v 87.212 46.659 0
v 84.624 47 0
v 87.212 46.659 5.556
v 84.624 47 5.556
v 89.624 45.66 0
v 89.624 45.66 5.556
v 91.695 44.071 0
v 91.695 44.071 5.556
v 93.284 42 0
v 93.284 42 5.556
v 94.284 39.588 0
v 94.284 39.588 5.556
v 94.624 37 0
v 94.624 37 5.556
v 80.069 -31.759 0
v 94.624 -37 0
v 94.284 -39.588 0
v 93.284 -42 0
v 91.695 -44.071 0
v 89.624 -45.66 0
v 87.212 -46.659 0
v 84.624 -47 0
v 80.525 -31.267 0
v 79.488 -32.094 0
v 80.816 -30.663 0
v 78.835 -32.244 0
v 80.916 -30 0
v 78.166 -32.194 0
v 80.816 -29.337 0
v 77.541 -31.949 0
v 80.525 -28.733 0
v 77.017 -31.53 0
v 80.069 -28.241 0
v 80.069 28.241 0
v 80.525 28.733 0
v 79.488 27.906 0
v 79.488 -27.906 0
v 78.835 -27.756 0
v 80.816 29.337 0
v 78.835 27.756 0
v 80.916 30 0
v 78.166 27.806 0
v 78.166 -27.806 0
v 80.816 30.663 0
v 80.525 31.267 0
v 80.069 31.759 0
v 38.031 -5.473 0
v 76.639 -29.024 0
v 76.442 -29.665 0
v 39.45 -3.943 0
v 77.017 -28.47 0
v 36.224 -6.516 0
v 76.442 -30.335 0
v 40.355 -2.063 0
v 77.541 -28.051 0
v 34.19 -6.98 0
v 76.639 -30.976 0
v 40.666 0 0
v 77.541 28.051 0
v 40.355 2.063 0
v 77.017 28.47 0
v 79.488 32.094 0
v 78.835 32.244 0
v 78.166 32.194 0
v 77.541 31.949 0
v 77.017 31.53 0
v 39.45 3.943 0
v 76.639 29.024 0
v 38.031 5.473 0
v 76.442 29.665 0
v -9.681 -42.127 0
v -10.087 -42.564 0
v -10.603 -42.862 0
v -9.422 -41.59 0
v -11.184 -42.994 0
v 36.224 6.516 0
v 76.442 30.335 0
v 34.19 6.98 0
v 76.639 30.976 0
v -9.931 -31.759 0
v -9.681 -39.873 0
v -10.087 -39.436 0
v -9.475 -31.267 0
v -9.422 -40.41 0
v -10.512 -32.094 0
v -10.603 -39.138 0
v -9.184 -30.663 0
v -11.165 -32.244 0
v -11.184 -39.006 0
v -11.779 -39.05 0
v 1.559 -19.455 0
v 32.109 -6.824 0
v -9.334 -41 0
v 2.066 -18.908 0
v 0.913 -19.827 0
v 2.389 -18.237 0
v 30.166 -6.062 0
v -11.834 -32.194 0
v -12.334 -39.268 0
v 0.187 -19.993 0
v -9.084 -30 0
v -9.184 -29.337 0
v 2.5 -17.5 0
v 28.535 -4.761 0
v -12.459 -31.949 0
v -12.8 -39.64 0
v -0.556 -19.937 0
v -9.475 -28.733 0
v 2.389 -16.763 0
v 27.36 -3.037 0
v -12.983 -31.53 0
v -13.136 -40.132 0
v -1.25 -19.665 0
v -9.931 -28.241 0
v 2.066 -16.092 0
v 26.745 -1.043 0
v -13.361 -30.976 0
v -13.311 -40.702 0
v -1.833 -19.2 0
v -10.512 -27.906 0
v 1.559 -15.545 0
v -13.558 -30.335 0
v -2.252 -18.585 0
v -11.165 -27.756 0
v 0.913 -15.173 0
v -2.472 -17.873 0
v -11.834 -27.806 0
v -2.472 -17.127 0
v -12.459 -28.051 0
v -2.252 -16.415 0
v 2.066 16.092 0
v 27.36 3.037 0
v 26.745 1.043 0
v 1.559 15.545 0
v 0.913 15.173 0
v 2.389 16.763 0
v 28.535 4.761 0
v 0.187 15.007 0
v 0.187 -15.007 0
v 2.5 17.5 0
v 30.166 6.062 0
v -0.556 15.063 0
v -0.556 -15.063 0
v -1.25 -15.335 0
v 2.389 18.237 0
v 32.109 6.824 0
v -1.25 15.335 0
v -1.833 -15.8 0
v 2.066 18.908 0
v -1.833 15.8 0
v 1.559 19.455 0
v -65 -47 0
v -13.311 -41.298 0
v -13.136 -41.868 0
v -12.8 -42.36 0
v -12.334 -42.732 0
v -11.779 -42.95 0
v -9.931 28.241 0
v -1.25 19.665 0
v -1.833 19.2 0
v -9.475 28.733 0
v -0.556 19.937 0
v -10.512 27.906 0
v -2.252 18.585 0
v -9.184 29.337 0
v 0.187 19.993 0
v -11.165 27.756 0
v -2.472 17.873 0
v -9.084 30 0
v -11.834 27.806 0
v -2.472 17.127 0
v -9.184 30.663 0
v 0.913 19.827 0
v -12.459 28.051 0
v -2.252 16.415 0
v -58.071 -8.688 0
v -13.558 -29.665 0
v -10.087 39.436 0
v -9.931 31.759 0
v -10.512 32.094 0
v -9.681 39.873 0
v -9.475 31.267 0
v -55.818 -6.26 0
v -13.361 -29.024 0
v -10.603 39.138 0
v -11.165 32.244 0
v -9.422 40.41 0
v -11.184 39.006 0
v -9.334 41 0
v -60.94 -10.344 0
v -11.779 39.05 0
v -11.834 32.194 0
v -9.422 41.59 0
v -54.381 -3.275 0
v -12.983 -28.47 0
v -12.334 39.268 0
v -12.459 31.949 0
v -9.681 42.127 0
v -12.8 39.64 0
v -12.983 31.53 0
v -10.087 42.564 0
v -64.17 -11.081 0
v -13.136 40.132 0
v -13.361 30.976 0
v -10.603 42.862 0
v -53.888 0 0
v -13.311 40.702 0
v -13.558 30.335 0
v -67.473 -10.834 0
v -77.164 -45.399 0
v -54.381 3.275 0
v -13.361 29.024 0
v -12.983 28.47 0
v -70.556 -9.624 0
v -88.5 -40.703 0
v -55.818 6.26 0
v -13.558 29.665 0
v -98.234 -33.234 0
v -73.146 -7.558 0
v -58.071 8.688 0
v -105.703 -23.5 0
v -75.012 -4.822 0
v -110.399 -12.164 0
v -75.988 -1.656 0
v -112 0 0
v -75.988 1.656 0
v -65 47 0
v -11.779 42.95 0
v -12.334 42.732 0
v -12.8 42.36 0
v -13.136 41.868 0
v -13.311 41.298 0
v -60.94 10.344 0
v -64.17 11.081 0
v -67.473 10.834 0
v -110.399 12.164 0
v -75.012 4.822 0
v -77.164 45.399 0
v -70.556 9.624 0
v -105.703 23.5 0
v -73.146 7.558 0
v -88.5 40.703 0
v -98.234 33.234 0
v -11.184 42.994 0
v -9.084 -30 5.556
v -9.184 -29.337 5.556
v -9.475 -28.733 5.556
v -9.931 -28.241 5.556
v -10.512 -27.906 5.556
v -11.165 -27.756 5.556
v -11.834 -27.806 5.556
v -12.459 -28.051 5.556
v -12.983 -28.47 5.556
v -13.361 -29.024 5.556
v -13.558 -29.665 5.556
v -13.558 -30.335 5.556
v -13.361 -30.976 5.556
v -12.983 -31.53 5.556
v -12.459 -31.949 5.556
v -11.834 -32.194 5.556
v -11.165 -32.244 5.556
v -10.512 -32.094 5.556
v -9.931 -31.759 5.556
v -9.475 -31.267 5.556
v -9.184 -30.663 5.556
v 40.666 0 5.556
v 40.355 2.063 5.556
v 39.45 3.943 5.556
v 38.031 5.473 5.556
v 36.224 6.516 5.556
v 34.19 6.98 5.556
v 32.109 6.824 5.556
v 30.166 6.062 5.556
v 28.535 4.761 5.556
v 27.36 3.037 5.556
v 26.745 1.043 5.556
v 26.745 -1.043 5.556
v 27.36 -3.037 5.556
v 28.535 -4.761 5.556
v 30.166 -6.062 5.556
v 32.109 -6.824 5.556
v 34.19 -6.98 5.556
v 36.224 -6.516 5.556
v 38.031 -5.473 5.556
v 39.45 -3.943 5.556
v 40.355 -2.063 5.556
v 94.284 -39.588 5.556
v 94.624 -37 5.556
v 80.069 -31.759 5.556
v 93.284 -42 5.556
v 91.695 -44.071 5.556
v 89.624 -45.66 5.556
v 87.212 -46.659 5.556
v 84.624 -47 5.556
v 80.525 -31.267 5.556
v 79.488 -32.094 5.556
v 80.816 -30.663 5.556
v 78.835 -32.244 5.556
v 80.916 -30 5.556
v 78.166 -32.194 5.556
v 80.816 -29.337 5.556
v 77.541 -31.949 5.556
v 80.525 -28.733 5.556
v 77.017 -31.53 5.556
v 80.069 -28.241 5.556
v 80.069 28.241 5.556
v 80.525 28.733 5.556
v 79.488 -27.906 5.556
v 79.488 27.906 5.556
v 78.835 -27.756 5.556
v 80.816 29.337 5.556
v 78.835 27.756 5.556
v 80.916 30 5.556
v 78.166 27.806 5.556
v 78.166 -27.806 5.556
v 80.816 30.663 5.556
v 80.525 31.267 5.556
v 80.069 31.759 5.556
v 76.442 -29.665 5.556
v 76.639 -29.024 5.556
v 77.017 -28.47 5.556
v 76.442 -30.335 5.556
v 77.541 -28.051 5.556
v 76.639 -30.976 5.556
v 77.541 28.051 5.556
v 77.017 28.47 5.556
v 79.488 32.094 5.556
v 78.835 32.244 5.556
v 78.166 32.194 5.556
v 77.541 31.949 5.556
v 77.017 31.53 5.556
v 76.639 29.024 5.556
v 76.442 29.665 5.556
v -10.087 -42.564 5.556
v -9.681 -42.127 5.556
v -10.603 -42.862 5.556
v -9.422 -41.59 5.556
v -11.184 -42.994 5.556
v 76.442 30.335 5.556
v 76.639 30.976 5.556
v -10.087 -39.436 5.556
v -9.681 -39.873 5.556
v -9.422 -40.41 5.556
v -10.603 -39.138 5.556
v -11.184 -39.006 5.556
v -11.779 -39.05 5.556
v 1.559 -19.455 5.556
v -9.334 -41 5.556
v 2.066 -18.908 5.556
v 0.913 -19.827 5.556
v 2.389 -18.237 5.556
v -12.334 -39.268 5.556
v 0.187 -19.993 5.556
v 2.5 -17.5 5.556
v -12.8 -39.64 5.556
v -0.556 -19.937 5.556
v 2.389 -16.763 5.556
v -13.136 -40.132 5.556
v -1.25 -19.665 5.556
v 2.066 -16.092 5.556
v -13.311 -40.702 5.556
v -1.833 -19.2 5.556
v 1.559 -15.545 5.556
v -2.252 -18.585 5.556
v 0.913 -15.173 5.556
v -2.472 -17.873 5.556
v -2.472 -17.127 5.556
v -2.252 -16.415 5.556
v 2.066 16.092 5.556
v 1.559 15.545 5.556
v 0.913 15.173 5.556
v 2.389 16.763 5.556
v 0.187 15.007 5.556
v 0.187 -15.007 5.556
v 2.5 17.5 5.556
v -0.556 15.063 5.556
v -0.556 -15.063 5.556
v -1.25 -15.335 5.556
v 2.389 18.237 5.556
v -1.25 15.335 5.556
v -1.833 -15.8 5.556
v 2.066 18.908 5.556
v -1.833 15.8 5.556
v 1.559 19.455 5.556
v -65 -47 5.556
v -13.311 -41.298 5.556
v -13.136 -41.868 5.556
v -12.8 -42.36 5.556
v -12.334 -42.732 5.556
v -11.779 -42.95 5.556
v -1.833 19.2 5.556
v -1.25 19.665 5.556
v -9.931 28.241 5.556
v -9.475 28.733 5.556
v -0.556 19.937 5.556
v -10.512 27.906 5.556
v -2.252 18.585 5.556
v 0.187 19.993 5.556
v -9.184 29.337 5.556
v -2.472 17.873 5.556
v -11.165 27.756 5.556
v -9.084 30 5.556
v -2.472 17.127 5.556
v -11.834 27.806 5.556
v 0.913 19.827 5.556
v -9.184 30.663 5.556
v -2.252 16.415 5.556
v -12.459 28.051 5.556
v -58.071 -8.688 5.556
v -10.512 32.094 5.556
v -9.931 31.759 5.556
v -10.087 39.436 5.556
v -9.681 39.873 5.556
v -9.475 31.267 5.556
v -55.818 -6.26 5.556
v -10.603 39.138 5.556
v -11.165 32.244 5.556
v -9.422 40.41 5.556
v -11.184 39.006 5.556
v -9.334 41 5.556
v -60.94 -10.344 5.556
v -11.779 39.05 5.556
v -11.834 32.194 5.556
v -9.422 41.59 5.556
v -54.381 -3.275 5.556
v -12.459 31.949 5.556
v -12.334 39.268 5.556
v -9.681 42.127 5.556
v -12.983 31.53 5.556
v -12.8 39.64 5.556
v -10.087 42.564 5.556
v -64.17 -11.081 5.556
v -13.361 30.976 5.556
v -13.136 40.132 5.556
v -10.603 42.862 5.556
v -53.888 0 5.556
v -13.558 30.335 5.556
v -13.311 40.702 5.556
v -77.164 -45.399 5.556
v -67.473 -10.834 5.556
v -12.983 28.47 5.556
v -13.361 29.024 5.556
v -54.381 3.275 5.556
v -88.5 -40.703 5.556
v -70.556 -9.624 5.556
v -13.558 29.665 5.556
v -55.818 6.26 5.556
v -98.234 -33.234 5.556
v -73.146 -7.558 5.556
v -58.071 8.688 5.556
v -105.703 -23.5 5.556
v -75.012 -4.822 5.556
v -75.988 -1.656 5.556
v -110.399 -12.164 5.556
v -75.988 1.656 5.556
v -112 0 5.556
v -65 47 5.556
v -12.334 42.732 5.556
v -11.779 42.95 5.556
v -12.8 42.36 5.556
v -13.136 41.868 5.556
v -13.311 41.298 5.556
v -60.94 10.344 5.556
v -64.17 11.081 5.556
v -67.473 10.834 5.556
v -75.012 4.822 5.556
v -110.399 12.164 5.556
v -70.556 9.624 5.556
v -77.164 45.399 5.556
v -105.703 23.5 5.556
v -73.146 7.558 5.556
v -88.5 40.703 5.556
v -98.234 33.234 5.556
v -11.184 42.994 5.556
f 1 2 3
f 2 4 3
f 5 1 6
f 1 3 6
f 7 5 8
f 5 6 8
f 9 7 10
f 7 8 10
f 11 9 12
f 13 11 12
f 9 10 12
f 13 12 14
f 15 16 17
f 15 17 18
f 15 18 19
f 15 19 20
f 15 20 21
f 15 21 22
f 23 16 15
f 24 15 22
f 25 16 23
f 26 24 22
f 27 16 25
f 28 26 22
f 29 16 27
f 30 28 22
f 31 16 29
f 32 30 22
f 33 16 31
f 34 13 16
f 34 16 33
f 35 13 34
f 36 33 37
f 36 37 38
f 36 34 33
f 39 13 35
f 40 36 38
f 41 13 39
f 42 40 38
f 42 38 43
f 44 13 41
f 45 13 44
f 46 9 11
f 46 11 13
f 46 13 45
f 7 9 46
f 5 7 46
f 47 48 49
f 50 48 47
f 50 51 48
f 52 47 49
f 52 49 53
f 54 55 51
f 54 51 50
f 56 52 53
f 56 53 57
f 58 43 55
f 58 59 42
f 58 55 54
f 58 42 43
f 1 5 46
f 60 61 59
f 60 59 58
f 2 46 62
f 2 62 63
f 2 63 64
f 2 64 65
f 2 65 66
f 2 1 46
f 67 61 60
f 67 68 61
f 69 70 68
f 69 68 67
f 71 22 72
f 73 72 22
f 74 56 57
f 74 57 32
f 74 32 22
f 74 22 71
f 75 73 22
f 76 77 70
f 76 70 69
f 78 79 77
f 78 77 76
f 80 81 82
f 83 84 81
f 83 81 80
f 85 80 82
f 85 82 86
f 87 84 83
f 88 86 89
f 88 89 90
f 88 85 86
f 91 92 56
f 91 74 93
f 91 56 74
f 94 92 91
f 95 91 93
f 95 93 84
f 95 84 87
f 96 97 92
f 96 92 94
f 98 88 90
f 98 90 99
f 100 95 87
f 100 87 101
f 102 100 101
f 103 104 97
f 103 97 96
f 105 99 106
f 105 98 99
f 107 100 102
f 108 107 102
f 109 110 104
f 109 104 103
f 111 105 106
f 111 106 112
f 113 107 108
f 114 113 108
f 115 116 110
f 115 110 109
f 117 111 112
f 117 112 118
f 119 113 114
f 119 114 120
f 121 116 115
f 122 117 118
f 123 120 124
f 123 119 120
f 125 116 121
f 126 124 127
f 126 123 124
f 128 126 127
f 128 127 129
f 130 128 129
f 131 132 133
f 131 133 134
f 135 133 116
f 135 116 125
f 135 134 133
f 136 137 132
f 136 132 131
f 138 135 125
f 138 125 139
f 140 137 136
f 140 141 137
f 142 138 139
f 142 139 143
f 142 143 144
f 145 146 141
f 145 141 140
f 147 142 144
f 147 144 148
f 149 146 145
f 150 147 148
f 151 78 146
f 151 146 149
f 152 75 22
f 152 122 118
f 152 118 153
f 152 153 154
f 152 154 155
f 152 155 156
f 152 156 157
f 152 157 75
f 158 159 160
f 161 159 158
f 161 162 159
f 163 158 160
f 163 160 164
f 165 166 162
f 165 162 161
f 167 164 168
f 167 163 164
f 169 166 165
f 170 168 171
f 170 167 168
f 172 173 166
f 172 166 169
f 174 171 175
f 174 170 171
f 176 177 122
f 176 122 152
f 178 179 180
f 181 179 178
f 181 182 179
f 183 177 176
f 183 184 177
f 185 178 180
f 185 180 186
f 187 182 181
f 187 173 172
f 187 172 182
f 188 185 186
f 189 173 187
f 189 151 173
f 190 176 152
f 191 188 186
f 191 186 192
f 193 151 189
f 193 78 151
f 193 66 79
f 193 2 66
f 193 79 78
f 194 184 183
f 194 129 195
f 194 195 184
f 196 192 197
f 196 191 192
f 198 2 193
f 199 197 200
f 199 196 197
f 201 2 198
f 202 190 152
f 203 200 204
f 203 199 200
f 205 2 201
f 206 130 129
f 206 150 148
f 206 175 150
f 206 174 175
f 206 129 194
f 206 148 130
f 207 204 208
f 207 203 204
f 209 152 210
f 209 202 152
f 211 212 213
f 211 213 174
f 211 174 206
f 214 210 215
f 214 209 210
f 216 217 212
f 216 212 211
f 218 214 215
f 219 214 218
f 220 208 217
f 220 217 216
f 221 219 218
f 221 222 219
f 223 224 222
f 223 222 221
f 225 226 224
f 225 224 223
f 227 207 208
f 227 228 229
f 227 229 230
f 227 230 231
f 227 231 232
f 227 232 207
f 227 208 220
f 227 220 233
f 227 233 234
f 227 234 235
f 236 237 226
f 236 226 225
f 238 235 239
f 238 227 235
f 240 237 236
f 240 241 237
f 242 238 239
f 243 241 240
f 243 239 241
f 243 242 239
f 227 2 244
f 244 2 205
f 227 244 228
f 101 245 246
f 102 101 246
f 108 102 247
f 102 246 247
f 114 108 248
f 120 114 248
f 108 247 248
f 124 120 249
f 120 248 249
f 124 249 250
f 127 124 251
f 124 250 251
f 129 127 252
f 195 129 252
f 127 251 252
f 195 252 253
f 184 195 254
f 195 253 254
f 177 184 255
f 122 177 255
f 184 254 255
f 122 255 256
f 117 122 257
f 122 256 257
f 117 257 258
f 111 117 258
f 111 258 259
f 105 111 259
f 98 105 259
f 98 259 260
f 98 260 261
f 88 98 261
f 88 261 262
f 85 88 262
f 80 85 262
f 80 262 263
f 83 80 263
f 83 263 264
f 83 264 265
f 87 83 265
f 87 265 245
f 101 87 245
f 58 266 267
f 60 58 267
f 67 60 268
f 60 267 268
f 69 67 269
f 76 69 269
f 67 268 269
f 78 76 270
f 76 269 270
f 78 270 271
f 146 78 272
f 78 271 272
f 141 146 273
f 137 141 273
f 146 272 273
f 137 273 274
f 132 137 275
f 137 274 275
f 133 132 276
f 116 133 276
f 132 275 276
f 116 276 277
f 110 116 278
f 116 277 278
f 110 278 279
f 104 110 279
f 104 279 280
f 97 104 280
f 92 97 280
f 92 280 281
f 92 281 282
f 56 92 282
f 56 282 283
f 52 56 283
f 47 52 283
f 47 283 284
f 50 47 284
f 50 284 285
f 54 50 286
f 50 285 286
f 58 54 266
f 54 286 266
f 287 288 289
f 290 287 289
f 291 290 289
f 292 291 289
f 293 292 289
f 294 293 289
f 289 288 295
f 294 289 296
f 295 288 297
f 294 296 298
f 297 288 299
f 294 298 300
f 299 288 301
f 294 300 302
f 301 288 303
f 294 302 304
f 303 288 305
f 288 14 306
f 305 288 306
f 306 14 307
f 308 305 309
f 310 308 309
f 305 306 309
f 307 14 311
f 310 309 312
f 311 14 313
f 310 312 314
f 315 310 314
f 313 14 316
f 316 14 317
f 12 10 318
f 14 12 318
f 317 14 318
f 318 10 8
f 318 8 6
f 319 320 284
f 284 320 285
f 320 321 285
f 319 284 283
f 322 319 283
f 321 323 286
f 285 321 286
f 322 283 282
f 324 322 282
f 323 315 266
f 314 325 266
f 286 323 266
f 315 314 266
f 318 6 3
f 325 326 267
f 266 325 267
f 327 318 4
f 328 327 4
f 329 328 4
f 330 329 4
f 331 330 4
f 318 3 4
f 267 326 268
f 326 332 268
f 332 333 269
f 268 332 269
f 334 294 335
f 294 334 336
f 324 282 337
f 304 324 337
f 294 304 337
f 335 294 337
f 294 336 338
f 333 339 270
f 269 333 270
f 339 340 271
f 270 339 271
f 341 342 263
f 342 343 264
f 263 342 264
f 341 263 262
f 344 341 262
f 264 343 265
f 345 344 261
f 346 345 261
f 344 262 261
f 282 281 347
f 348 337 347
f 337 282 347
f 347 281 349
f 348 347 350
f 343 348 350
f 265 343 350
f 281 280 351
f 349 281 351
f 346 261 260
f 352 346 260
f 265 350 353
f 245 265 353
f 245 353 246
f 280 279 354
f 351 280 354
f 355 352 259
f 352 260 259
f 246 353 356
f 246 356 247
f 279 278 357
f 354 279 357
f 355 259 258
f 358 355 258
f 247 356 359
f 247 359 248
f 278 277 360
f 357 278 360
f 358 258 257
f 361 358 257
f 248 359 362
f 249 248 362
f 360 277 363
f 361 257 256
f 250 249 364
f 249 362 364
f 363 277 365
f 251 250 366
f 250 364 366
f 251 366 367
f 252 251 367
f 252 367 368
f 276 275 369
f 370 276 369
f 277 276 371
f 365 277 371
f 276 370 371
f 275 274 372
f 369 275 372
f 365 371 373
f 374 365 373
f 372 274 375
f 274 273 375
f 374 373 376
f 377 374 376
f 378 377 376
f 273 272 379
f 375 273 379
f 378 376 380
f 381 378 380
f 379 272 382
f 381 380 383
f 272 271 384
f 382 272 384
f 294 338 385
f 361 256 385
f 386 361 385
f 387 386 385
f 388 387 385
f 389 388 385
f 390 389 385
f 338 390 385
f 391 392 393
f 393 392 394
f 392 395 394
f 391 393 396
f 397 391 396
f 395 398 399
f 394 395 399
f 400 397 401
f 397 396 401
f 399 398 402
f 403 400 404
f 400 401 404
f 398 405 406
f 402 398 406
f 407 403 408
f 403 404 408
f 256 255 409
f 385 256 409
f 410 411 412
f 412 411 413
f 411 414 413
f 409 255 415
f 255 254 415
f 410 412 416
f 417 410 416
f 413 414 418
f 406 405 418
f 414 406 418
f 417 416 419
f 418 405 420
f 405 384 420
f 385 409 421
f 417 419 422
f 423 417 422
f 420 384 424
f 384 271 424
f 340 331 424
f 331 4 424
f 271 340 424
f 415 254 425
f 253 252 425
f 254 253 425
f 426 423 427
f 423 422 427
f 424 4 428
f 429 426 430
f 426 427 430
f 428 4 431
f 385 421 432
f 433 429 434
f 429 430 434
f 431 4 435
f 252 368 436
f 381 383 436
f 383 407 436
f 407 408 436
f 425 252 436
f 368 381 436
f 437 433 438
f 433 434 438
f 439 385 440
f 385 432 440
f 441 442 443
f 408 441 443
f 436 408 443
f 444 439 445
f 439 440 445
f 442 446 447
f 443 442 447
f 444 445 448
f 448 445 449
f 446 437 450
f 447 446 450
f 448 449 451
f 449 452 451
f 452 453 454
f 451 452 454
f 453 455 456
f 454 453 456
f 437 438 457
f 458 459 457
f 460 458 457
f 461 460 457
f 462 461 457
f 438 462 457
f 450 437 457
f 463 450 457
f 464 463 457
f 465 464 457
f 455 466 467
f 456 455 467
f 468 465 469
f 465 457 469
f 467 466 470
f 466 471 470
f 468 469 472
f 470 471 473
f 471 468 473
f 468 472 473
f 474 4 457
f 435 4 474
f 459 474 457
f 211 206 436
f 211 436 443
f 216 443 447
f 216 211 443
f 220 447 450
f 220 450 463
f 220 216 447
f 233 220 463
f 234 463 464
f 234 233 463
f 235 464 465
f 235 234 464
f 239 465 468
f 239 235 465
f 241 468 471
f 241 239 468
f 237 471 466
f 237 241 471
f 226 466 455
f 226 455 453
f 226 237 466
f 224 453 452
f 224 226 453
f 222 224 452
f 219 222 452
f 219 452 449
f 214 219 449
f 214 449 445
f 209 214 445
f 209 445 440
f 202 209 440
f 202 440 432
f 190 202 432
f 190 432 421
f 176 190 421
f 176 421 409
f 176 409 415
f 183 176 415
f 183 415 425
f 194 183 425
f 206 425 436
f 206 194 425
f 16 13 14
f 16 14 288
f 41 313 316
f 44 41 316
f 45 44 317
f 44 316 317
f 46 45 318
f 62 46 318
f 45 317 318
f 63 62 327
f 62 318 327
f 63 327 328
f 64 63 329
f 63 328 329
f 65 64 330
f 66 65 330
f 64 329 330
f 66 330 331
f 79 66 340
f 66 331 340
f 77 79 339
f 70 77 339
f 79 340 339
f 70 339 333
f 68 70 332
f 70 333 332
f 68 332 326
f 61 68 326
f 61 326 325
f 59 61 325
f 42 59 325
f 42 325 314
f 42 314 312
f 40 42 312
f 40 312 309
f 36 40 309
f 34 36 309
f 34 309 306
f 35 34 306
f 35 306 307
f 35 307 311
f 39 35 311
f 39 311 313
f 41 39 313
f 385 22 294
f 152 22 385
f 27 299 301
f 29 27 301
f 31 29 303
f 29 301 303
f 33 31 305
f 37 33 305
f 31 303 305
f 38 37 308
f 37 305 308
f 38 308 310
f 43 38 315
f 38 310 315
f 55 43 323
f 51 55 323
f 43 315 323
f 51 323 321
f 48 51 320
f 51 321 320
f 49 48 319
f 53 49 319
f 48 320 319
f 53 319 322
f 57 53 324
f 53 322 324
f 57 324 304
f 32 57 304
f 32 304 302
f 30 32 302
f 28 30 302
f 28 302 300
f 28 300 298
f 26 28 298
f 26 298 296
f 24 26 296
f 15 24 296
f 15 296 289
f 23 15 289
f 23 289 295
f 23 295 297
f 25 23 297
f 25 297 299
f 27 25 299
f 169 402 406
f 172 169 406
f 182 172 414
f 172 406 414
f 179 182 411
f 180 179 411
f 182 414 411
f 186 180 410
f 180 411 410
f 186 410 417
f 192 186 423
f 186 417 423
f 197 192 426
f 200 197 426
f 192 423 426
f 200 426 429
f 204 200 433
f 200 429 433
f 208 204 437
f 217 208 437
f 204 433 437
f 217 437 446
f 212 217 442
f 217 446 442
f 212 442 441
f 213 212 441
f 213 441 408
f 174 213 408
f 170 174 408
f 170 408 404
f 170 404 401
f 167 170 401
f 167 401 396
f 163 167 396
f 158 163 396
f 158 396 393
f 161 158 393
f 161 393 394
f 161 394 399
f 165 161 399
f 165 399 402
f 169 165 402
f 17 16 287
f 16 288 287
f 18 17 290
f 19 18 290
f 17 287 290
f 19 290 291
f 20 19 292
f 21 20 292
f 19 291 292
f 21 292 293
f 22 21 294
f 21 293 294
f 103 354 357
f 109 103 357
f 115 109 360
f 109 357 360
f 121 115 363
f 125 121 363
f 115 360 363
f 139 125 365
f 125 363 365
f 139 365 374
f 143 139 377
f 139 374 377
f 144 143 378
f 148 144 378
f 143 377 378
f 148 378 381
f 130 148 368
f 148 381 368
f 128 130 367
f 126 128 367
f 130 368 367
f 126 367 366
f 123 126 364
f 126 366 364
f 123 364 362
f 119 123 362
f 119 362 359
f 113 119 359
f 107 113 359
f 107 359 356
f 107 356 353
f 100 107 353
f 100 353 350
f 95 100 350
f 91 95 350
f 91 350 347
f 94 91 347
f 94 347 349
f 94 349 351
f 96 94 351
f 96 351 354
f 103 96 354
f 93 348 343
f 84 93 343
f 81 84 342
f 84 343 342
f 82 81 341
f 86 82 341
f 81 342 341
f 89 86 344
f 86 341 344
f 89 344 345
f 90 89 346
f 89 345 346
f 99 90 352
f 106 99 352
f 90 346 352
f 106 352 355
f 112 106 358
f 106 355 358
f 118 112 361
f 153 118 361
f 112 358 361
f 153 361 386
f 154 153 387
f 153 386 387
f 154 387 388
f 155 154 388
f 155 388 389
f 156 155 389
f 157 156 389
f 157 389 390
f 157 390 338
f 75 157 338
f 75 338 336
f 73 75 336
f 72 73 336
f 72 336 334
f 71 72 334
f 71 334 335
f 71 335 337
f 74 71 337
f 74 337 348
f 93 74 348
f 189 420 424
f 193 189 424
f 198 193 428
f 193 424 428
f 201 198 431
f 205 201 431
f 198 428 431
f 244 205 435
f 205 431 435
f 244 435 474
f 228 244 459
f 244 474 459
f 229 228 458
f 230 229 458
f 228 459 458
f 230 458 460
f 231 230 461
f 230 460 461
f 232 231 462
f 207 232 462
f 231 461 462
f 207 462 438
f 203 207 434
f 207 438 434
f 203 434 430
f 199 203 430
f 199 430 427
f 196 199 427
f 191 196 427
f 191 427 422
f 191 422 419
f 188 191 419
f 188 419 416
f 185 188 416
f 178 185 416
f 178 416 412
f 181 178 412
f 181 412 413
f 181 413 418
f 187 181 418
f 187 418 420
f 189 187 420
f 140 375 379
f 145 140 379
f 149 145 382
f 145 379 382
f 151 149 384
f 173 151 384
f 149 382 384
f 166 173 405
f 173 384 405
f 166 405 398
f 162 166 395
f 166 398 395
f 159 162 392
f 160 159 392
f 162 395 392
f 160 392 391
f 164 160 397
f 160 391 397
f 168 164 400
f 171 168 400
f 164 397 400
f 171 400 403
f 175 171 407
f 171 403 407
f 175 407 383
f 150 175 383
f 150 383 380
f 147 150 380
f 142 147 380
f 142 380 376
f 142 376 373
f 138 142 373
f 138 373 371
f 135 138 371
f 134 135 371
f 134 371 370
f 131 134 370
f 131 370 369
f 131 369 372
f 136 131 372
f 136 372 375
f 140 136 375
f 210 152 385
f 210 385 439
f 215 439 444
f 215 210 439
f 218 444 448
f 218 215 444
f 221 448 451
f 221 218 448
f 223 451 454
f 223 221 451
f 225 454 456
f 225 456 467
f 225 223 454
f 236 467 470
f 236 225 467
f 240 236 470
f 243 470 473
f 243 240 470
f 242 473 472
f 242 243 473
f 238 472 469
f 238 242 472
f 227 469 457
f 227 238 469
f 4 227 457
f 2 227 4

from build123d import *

# Parameters (mm, degrees)
SKETCH1_R           = 11.1125
BOSS_EXTRUDE1_DEPTH = 5.55625
SKETCH2_R           = 7
CUT_EXTRUDE1_DEPTH  = 5.55625
FILLET1_R           = 10
SKETCH3_R           = 2.25
SKETCH3_R_2         = 2
CUT_EXTRUDE2_DEPTH  = 6.35
SKETCH4_R           = 2.5
CUT_EXTRUDE3_DEPTH  = 40


with BuildPart() as part:
    # Sketch1 → Boss-Extrude1 (new body)
    with BuildSketch(Plane.XY):
        with BuildLine():
            Line((-65, 47), (94.62424518, 47))
            Line((94.62424518, 47), (94.62424518, -47))
            Line((94.62424518, -47), (-65, -47))
            ThreePointArc((-65, -47), (-112, 0), (-65, 47))
        make_face()
        with Locations((-65, 0)):
            Circle(SKETCH1_R, mode=Mode.SUBTRACT)
    extrude(amount=BOSS_EXTRUDE1_DEPTH)

    # Sketch2 → Cut-Extrude1 (cut)
    with BuildSketch(Plane.XY.offset(5.55625)):
        with Locations((33.666397681, 0)):
            Circle(SKETCH2_R)
    extrude(amount=-CUT_EXTRUDE1_DEPTH, mode=Mode.SUBTRACT)

    # Fillet1
    fillet1_edges = [part.edges().sort_by_distance(p)[0] for p in [
        (94.62424518, 47, 2.778125),
        (94.62424518, -47, 2.778125),
    ]]
    fillet(fillet1_edges, radius=FILLET1_R)

    # Sketch3 → Cut-Extrude2 (cut)
    with BuildSketch(Plane.XY.offset(5.55625)):
        with Locations((78.666397681, 30)):
            Circle(SKETCH3_R)
        with Locations((78.666397681, -30)):
            Circle(SKETCH3_R)
        with Locations((-11.333602319, 30)):
            Circle(SKETCH3_R)
        with Locations((-11.333602319, -30)):
            Circle(SKETCH3_R)
        with Locations((-11.333602319, 41)):
            Circle(SKETCH3_R_2)
        with Locations((-11.333602319, -41)):
            Circle(SKETCH3_R_2)
    extrude(amount=-CUT_EXTRUDE2_DEPTH, mode=Mode.SUBTRACT)

    # Sketch4 → Cut-Extrude3 (cut)
    with BuildSketch(Plane.XY.offset(5.55625)):
        with Locations((0, 17.5)):
            Circle(SKETCH4_R)
        with Locations((0, -17.5)):
            Circle(SKETCH4_R)
    extrude(amount=-CUT_EXTRUDE3_DEPTH, mode=Mode.SUBTRACT)


solid = part.part
